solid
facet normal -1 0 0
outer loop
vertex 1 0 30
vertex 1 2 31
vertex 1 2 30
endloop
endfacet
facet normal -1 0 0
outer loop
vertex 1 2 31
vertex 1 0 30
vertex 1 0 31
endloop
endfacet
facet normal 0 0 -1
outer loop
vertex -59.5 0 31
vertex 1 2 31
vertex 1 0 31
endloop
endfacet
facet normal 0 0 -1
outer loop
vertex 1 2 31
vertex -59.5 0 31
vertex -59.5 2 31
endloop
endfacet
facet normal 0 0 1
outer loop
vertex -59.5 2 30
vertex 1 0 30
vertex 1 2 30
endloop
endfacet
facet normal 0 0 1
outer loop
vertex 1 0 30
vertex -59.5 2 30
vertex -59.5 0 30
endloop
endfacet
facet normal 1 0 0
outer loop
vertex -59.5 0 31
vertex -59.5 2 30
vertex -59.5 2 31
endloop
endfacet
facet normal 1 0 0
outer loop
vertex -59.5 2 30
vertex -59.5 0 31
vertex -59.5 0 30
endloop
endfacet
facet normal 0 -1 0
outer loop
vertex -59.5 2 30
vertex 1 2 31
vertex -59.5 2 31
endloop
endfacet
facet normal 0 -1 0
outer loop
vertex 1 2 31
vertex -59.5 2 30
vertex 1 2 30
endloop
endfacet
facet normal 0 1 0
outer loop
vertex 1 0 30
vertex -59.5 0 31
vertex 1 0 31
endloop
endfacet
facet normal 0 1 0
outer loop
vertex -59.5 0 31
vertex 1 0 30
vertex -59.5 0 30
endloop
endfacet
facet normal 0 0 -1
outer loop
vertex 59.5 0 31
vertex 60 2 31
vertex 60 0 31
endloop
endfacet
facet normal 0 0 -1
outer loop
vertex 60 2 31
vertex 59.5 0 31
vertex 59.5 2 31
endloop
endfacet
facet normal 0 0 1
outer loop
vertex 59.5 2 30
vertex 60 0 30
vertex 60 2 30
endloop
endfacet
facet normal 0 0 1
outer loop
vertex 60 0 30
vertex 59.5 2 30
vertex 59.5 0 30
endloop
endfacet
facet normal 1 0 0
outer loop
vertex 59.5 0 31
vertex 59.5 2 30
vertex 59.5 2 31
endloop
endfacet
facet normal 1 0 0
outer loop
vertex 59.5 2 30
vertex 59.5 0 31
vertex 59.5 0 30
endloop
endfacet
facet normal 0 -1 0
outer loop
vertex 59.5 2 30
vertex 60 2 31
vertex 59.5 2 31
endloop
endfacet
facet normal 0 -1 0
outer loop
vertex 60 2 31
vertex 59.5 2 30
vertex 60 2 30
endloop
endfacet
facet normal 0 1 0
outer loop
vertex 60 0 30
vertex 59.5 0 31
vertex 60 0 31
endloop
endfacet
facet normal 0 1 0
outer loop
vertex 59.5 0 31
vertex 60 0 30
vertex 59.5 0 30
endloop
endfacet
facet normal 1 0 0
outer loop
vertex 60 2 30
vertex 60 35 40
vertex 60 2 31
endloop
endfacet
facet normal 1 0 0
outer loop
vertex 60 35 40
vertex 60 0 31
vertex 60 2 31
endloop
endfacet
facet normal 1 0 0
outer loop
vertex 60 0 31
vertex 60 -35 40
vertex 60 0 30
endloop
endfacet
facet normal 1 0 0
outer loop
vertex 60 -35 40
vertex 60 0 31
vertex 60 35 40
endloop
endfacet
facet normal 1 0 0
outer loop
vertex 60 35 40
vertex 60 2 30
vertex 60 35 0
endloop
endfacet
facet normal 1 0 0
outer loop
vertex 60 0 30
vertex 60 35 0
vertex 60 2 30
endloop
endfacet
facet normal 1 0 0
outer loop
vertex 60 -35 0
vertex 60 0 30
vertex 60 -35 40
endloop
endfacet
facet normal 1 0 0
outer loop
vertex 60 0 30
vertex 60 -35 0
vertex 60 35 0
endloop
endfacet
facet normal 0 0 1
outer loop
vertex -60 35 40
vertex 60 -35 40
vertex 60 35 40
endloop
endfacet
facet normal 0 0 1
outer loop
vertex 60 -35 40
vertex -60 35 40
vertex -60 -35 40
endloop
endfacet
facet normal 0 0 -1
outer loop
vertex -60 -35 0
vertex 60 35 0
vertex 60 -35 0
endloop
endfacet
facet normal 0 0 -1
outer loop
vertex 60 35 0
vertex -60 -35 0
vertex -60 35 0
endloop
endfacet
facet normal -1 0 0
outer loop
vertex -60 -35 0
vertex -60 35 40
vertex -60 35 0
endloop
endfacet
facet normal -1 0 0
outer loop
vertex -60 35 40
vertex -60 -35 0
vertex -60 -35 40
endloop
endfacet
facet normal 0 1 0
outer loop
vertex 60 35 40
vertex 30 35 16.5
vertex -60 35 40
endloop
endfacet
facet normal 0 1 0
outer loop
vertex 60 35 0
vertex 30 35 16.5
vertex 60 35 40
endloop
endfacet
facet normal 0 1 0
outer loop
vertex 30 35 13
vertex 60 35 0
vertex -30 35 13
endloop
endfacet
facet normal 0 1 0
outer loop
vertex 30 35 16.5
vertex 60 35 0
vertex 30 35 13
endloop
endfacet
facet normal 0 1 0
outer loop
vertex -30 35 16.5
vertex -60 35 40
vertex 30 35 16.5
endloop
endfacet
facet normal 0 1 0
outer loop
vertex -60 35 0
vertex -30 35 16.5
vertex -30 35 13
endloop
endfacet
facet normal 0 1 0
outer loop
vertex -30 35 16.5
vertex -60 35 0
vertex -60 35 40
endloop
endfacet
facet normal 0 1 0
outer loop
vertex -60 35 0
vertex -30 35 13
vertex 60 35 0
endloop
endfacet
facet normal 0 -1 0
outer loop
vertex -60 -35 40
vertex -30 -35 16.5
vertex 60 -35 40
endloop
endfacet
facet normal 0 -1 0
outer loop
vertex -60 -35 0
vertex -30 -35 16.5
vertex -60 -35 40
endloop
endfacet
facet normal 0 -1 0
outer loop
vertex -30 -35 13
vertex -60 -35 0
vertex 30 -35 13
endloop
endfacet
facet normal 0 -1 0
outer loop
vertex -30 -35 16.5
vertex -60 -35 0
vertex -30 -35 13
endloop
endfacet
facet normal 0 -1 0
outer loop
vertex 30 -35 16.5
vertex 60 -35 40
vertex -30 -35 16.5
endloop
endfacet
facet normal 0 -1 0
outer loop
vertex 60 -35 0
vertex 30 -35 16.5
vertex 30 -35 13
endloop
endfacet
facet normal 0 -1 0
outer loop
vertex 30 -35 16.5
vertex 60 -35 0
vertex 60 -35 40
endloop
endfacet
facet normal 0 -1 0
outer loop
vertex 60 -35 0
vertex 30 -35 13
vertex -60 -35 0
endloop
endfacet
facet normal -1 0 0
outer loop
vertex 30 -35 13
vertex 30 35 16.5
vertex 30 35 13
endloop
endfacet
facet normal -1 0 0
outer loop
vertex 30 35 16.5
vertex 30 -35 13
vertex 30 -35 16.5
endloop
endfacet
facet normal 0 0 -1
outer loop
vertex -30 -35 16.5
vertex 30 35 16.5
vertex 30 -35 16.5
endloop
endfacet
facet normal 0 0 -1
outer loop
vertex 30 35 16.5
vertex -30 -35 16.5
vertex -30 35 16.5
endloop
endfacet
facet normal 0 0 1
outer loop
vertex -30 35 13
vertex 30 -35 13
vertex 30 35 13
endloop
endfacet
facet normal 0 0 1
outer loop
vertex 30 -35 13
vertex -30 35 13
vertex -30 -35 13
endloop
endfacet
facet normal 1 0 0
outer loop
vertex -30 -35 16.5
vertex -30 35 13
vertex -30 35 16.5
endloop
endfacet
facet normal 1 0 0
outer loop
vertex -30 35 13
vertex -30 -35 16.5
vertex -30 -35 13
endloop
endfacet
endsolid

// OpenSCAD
// Mini horizontal gel-electrophoresis box - buffer tank
// Print orientation: open top facing up (+Z), resting on XY plane at z = 0

// ---------------- Parameters ----------------
tank_x      = 120;   // outer length along X (mm)
tank_y      = 70;    // outer width along Y (mm)
tank_h      = 40;    // outer height along Z (mm)

wall        = 3;     // wall thickness (mm)
floor       = 3;     // floor thickness (mm)

platform_x  = 60;    // platform length along X (mm), centred
platform_y  = tank_y; // platform spans full inner width (mm)
platform_top = 16;   // platform top height above tank floor (mm)
// Note: platform_top is absolute height in the model (floor is at z = 0)

hole_d      = 2;     // electrode hole diameter (mm)
hole_y      = 0;     // electrode hole Y position (mm)
hole_z      = 30;    // electrode hole Z position (mm)

eps         = 0.5;   // cutter overshoot past faces (mm)

$fn = 96;

// ---------------- Derived ----------------
inner_x = tank_x - 2 * wall;   // inner length along X
inner_y = tank_y - 2 * wall;   // inner width along Y
// platform sits on the floor, centred along X, full width in Y

// ---------------- Model ----------------
difference() {
    // Main tank body (open top)
    translate([-tank_x / 2, -tank_y / 2, 0])
        cube([tank_x, tank_y, tank_h]);

    // Raised platform for gel tray
    translate([-platform_x / 2, -platform_y / 2, platform_top - floor])
        cube([platform_x, platform_y, floor + eps]);  // extends into tank

    // Horizontal electrode holes through each end wall, along X
    for (s = [-1, 1])
        translate([s * (tank_x / 2 - eps), hole_y, hole_z])
            cube([tank_x / 2 + eps, hole_d, 1]);  // runs through the end wall
}
